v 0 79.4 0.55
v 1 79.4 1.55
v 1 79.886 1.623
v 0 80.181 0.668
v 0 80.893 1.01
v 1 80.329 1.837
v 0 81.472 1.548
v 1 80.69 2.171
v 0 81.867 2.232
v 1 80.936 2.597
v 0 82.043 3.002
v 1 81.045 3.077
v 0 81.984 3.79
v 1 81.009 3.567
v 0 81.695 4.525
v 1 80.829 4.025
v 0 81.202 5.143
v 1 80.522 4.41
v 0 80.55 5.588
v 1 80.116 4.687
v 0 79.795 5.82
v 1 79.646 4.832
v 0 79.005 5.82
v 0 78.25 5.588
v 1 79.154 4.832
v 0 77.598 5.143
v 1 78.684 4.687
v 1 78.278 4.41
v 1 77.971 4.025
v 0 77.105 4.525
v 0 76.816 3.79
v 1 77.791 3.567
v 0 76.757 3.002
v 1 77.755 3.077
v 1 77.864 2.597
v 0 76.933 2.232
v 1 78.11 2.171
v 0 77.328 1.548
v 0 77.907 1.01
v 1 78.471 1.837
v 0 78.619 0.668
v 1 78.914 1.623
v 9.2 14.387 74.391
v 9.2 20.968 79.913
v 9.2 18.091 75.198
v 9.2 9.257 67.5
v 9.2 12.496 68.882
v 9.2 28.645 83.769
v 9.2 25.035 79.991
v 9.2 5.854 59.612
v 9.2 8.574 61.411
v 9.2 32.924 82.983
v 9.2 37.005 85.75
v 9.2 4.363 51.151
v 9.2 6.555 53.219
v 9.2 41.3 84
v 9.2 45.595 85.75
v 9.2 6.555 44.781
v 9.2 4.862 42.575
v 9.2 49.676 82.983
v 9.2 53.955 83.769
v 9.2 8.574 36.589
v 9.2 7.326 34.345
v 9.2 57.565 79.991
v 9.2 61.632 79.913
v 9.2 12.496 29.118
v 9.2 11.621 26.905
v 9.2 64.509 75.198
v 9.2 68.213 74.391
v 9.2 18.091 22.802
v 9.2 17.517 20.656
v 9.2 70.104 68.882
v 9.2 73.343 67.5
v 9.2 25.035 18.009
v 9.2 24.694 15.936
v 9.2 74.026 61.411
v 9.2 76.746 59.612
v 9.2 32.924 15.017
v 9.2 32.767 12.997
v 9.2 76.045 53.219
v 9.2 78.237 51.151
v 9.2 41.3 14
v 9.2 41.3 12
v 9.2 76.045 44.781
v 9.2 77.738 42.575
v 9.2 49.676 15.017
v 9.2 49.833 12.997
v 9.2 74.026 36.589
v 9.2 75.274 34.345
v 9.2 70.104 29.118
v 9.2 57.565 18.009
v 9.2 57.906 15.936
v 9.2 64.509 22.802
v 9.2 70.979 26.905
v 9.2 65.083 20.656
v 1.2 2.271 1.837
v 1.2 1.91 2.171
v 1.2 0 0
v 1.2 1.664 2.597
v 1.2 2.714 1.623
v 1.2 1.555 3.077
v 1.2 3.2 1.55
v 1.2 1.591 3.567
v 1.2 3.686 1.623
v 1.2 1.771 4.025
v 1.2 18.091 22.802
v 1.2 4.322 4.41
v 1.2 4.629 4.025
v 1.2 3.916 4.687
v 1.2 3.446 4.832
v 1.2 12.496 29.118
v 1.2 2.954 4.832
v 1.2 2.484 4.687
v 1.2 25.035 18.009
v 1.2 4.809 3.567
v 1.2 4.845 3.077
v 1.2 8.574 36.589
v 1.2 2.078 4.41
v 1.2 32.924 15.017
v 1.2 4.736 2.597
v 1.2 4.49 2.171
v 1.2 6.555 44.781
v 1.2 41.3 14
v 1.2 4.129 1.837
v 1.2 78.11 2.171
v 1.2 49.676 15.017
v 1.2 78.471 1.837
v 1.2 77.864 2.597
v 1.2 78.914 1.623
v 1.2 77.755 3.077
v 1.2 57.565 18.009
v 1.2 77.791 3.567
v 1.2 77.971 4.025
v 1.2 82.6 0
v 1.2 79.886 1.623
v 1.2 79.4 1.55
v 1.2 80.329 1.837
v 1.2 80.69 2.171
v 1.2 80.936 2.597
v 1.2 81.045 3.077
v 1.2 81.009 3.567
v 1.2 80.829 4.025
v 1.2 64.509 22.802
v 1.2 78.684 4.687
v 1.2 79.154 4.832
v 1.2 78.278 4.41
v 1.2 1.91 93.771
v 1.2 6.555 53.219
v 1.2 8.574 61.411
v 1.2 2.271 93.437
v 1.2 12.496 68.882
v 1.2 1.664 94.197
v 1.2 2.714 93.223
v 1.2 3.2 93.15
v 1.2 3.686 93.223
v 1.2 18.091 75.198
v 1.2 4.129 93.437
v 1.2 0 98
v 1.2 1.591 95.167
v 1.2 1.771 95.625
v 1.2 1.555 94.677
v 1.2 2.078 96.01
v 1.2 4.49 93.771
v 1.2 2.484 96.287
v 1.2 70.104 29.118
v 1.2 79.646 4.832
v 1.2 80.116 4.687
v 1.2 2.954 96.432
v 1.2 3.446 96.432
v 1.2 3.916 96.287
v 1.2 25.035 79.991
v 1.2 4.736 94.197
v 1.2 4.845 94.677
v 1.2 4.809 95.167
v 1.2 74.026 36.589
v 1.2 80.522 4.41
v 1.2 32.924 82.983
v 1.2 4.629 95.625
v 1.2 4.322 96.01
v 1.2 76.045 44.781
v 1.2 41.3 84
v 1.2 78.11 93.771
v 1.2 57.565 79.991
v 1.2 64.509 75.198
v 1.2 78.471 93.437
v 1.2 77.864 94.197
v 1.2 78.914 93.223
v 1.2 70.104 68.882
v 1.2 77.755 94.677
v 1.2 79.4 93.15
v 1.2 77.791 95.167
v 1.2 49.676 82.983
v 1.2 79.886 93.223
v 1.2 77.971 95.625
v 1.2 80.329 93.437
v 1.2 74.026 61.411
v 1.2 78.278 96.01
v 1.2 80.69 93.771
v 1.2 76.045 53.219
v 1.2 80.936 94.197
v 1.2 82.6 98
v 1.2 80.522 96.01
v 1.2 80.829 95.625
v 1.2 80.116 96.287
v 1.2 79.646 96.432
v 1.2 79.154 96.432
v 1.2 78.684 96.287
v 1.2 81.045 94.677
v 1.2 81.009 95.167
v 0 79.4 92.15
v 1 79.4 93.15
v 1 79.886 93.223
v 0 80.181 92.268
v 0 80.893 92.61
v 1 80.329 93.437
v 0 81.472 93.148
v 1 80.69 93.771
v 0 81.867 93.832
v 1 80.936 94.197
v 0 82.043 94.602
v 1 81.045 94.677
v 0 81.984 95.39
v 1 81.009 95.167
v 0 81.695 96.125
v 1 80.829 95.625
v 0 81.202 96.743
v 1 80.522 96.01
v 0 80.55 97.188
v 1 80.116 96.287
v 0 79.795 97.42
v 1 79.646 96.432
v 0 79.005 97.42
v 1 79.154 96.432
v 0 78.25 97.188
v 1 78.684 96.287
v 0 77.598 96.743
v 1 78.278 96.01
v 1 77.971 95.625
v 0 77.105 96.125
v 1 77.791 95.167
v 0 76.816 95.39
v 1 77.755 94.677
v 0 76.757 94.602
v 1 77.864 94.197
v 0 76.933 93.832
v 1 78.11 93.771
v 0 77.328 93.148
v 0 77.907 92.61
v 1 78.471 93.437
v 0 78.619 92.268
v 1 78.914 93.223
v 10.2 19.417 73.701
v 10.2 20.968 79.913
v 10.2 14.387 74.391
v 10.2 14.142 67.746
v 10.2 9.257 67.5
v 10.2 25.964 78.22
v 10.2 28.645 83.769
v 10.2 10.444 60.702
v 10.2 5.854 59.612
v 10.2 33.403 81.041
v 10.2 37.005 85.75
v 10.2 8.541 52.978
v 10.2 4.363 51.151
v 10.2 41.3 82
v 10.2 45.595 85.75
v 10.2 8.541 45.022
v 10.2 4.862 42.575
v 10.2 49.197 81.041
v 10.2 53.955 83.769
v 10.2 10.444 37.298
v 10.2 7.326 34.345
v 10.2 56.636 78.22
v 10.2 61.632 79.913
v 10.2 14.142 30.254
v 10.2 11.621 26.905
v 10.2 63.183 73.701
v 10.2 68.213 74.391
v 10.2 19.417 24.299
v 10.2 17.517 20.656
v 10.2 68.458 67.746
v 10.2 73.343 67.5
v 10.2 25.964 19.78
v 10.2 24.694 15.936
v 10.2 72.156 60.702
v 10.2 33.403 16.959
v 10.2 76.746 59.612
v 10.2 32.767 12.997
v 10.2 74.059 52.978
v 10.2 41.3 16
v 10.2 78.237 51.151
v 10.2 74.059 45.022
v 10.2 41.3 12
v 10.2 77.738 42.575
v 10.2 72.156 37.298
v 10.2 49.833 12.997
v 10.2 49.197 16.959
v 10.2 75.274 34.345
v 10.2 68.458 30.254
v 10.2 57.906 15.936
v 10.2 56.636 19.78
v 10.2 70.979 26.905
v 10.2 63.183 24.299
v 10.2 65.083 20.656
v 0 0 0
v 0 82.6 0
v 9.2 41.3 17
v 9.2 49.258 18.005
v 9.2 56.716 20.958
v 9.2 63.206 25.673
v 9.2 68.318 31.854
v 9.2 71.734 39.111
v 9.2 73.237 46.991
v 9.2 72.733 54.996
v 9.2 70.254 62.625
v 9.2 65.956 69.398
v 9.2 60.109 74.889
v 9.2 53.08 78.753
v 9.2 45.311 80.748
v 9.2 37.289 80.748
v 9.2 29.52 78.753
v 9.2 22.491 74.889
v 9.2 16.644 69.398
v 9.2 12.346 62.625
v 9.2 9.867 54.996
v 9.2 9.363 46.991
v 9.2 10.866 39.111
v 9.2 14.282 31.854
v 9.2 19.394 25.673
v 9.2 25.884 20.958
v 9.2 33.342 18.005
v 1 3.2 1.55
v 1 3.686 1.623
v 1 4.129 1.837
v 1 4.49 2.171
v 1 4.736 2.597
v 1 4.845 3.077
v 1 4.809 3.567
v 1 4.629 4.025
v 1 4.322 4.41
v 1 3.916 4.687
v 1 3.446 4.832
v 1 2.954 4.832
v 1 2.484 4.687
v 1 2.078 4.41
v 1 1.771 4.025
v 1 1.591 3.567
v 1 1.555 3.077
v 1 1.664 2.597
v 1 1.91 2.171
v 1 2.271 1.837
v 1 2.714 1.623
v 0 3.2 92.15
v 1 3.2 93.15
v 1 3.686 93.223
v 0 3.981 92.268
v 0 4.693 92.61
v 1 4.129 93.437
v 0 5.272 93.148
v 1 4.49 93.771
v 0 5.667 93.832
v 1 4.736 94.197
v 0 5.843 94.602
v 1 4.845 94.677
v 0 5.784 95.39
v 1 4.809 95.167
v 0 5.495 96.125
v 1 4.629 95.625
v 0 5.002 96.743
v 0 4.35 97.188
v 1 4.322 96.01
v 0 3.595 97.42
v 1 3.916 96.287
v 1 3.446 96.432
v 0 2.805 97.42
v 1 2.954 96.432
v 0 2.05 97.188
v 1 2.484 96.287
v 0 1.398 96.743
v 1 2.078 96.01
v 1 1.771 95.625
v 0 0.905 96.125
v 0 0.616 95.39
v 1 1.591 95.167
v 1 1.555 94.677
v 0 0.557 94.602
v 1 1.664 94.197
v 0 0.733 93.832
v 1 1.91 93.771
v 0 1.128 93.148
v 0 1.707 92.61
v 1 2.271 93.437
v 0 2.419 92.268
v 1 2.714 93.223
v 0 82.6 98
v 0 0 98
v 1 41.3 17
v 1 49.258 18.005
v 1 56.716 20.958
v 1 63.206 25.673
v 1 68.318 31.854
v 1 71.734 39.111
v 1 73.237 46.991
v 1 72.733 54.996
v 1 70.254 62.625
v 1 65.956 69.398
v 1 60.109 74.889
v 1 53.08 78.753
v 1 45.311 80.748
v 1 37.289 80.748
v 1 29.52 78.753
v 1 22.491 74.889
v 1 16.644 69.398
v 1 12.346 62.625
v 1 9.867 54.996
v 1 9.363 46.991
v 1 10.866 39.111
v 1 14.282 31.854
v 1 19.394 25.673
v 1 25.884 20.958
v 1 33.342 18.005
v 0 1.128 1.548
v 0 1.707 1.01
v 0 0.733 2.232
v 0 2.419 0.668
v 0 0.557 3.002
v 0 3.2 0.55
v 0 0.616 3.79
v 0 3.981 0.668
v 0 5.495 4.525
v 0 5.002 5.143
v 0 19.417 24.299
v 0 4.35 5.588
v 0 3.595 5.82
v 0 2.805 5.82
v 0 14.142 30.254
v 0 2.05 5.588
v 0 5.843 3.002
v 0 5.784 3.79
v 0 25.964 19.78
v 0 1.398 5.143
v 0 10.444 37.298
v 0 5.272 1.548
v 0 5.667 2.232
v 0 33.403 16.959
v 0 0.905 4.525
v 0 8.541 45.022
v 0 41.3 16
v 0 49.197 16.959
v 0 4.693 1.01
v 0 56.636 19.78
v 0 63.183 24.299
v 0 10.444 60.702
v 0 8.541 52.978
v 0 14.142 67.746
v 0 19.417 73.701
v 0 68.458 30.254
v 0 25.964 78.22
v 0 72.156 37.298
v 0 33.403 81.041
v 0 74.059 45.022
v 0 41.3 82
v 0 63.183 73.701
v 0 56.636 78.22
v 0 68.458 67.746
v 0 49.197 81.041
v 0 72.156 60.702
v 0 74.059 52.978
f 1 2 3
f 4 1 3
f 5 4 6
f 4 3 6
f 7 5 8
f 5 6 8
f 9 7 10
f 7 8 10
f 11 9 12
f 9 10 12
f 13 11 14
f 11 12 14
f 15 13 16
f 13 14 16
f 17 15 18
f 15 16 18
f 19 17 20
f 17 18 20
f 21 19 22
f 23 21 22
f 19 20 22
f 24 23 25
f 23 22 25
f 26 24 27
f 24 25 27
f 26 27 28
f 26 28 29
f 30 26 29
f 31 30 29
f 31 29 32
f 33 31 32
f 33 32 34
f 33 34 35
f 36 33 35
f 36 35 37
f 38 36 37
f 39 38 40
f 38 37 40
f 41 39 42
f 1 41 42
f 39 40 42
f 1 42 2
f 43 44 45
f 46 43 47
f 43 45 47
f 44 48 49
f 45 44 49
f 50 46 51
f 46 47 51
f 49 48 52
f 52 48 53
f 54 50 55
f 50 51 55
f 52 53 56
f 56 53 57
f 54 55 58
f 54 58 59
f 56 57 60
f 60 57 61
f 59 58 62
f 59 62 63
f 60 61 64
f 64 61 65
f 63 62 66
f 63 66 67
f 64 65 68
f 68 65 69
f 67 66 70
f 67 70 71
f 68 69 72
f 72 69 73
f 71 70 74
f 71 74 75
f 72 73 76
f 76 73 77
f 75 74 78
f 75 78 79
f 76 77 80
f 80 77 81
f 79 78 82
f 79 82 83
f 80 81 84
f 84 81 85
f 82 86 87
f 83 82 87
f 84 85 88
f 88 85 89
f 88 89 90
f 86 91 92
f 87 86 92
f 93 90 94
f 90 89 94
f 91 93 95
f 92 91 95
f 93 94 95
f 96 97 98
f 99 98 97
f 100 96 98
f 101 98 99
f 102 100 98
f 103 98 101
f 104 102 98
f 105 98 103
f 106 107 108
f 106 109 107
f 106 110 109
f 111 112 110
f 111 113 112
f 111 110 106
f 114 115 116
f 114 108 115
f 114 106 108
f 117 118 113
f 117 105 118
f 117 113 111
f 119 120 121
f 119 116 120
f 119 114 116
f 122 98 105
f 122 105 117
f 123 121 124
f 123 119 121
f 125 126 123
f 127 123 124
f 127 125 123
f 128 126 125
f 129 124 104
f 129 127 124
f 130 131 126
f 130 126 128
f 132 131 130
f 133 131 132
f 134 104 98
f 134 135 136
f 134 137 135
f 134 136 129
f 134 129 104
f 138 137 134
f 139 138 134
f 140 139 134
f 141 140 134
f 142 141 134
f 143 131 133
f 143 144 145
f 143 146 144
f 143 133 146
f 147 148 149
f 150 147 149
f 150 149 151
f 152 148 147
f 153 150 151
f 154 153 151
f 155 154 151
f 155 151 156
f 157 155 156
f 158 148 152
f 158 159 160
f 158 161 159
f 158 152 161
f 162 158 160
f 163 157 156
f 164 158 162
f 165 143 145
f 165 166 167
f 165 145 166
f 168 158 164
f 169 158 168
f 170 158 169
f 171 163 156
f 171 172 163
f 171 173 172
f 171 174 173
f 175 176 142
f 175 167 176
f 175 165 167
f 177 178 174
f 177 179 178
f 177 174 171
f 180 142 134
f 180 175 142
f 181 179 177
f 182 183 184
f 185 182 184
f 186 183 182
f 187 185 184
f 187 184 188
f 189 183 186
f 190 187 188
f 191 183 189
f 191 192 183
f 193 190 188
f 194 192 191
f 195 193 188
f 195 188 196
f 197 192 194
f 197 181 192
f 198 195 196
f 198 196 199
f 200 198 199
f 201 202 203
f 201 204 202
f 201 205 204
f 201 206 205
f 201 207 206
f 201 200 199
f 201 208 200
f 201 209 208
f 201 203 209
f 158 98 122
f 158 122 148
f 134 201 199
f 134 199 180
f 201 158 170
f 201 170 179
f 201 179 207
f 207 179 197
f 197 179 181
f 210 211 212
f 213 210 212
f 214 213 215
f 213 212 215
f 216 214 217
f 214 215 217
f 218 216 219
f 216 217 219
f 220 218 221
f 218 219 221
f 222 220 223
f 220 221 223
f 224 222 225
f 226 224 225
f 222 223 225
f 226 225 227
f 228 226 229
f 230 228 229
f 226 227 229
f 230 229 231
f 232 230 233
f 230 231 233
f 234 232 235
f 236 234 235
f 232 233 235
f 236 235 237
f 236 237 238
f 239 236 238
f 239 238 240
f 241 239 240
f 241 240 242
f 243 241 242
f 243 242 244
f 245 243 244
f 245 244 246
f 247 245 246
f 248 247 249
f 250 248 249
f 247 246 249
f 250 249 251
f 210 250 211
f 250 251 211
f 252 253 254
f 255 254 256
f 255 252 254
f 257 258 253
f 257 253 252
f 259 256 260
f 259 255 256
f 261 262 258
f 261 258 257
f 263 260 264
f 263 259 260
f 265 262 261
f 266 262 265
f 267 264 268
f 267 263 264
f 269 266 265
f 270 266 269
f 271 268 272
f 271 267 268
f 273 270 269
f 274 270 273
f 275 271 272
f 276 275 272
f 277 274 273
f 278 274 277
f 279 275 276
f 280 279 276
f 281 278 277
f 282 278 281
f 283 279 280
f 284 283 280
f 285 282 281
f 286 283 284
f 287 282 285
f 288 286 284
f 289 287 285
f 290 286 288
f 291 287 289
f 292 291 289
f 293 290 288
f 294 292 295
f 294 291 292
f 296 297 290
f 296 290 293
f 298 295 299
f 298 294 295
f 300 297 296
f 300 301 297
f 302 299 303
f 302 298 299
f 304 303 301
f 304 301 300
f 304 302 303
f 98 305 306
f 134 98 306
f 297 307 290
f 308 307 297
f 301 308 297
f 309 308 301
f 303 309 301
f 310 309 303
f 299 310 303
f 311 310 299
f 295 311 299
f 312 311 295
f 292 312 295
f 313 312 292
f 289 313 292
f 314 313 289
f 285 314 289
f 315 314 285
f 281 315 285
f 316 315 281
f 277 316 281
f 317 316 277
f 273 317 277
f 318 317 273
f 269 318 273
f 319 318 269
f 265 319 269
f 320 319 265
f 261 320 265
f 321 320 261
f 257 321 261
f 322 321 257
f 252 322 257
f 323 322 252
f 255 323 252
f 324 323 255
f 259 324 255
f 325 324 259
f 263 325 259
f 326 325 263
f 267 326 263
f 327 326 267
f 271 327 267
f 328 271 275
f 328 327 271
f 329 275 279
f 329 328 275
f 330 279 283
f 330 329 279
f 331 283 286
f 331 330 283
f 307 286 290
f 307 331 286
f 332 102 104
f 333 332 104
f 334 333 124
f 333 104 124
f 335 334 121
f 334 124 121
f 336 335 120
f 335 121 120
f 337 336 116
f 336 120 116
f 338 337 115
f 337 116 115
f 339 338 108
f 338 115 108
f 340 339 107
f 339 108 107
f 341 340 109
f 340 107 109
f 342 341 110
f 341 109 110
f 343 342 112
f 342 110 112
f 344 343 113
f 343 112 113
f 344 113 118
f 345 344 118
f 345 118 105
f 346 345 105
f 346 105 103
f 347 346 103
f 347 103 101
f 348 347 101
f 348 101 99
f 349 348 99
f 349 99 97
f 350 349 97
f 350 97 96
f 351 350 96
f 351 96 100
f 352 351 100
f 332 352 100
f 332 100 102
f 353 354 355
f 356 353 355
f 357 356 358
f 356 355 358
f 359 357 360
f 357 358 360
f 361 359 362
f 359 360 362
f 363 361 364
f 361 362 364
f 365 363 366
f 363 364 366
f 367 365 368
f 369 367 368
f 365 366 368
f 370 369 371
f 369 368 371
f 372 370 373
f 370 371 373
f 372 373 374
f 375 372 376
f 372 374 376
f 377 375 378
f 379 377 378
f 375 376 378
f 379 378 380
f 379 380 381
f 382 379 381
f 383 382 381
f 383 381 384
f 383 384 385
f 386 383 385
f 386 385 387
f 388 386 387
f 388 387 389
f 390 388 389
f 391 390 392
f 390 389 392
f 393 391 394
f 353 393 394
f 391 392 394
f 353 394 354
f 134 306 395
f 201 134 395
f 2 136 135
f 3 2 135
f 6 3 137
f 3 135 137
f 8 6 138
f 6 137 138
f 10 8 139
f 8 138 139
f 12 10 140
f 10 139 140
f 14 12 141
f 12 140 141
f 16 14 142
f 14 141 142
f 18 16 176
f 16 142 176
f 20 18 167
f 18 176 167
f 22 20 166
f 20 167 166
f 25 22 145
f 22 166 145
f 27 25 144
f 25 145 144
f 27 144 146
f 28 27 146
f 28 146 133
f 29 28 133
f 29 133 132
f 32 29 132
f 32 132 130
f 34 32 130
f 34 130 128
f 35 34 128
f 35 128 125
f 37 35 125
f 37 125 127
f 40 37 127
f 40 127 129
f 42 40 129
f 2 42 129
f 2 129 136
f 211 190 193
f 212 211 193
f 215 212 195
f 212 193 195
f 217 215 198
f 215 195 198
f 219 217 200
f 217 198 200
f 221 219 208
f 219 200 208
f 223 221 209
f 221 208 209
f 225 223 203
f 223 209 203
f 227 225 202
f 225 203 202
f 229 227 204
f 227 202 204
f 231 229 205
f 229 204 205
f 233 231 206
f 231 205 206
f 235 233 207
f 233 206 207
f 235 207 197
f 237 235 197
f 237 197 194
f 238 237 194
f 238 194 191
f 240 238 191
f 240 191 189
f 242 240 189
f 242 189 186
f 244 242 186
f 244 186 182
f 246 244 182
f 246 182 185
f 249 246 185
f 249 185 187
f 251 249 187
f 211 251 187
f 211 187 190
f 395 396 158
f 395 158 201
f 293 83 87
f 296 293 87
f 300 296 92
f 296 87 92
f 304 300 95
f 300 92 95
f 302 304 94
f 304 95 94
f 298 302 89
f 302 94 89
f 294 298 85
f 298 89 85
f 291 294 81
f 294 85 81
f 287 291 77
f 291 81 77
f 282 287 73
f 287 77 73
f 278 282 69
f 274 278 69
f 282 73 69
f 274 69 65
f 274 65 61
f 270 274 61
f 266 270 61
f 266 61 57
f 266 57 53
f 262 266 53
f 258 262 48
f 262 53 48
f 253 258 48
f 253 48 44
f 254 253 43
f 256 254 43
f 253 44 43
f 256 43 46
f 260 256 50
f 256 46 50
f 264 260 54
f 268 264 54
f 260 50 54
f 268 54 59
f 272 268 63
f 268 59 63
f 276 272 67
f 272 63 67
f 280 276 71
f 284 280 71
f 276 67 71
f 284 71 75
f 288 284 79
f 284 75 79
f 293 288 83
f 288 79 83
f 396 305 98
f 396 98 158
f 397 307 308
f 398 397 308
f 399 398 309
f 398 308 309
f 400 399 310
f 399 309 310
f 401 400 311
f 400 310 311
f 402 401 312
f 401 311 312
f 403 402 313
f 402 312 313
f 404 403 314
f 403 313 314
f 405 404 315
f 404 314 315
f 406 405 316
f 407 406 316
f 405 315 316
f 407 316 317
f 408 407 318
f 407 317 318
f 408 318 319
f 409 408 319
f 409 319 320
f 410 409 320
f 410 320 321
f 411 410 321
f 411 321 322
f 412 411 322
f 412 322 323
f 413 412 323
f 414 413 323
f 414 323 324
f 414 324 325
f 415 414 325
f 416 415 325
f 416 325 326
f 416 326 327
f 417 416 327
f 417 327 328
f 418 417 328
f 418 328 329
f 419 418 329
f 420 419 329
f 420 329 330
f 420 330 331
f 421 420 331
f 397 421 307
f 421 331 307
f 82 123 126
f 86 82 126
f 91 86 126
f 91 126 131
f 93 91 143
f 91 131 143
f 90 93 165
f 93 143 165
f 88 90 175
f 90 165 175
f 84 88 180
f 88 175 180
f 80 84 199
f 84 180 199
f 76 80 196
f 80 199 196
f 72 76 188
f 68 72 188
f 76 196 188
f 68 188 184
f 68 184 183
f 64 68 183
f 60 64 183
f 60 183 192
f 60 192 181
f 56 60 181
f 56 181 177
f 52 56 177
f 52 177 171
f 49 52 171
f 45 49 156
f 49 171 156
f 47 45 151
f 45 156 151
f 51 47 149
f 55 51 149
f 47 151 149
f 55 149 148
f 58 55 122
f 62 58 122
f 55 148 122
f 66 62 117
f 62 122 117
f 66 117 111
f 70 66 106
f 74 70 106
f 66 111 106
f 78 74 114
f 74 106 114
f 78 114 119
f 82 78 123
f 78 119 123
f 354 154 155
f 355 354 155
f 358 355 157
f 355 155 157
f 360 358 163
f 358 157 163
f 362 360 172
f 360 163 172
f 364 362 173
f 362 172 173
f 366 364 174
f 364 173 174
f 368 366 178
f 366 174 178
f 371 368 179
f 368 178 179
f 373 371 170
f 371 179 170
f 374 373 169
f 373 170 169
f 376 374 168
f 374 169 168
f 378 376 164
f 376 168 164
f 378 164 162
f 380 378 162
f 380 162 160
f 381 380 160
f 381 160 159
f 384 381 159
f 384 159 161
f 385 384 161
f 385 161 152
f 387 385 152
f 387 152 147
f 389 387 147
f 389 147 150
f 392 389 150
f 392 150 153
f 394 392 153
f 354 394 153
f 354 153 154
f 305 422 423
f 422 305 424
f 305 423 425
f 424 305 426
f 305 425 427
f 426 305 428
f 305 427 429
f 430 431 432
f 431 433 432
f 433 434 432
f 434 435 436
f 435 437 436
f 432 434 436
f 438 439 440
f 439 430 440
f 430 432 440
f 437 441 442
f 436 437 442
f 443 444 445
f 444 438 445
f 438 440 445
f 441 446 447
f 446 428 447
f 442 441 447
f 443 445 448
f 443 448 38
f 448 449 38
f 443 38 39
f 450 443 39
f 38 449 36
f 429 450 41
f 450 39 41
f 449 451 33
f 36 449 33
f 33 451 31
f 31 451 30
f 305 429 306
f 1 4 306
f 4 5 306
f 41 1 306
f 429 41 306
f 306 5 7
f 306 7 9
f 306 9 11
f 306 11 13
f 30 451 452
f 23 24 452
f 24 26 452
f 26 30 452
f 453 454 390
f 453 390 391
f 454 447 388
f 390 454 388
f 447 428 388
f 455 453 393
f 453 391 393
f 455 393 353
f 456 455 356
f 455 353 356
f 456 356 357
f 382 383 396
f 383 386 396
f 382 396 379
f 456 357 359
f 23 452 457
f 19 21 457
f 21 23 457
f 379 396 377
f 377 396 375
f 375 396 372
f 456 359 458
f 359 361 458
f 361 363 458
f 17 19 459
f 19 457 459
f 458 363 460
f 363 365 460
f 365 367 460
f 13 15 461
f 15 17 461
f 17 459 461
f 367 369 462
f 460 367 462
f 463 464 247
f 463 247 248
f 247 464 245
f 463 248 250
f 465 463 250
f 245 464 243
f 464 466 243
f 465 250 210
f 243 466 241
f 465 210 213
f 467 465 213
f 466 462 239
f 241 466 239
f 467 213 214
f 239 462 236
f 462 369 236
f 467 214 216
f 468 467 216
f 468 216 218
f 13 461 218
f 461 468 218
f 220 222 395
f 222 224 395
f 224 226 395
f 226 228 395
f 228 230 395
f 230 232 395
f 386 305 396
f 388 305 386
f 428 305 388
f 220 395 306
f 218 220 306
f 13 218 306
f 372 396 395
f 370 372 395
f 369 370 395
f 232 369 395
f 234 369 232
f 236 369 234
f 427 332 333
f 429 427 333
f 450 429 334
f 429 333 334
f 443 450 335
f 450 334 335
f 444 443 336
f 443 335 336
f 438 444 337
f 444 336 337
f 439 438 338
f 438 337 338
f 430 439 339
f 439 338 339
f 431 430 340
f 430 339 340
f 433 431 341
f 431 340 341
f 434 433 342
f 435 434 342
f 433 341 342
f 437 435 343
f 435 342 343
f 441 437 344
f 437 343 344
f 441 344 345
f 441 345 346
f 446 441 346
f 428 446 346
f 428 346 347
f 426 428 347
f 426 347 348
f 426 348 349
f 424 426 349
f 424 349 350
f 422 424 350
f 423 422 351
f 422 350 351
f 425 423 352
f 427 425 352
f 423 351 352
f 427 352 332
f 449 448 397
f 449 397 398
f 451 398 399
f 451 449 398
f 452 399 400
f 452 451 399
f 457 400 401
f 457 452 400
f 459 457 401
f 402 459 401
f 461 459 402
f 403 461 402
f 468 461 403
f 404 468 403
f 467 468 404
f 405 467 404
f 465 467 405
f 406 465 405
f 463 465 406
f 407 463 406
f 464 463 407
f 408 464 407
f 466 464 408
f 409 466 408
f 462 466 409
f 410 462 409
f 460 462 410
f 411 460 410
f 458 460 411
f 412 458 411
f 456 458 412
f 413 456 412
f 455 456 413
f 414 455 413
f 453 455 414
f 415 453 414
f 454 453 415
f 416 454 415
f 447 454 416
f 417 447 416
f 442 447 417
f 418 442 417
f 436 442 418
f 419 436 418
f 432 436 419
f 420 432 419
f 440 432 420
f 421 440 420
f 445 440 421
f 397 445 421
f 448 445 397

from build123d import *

# Parameters (mm, degrees)
SKETCH1_W           = 82.6
SKETCH1_H           = 98
BOSS_EXTRUDE1_DEPTH = 1.2
SKETCH2_R           = 1.65
CUT_EXTRUDE1_DEPTH  = 129.172539961
SKETCH3_R           = 35
BOSS_EXTRUDE2_DEPTH = 8
SKETCH4_R           = 37
BOSS_EXTRUDE3_DEPTH = 1
SKETCH5_R           = 32
CUT_EXTRUDE2_DEPTH  = 129.572158728
CHAMFER1_SIZE       = 1


with BuildPart() as part:
    # Sketch1 → Boss-Extrude1 (new body)
    with BuildSketch(Plane.YZ):
        with Locations((41.3, 49)):
            Rectangle(SKETCH1_W, SKETCH1_H)
    extrude(amount=BOSS_EXTRUDE1_DEPTH)

    # Sketch2 → Cut-Extrude1 (cut, through all)
    with BuildSketch(Plane.YZ.offset(1.2)):
        with Locations(Location((3.2, 94.8, 0), (0, 0, 270))):
            Circle(SKETCH2_R)
        with Locations(Location((79.4, 94.8, 0), (0, 0, 270))):
            Circle(SKETCH2_R)
        with Locations(Location((3.2, 3.2, 0), (0, 0, 270))):
            Circle(SKETCH2_R)
        with Locations(Location((79.4, 3.2, 0), (0, 0, 270))):
            Circle(SKETCH2_R)
    extrude(amount=-CUT_EXTRUDE1_DEPTH, mode=Mode.SUBTRACT)

    # Sketch3 → Boss-Extrude2 (add)
    with BuildSketch(Plane.YZ.offset(1.2)):
        with Locations(Location((41.3, 49, 0), (0, 0, 270))):
            Circle(SKETCH3_R)
    extrude(amount=BOSS_EXTRUDE2_DEPTH)

    # Sketch4 → Boss-Extrude3 (add)
    with BuildSketch(Plane.YZ.offset(9.2)):
        with Locations(Location((41.3, 49, 0), (0, 0, 270))):
            Circle(SKETCH4_R)
    extrude(amount=BOSS_EXTRUDE3_DEPTH)

    # Sketch5 → Cut-Extrude2 (cut, through all)
    with BuildSketch(Plane.YZ.offset(10.2)):
        with Locations(Location((41.3, 49, 0), (0, 0, 270))):
            Circle(SKETCH5_R)
    extrude(amount=-CUT_EXTRUDE2_DEPTH, mode=Mode.SUBTRACT)

    # Chamfer1
    chamfer1_edges = [part.edges().sort_by_distance(p)[0] for p in [
        (0, 79.4, 96.45),
        (0, 3.2, 4.85),
        (0, 79.4, 4.85),
        (0, 3.2, 96.45),
        (0, 41.3, 81),
        (10.2, 41.3, 81),
    ]]
    chamfer(chamfer1_edges, length=CHAMFER1_SIZE)


solid = part.part
